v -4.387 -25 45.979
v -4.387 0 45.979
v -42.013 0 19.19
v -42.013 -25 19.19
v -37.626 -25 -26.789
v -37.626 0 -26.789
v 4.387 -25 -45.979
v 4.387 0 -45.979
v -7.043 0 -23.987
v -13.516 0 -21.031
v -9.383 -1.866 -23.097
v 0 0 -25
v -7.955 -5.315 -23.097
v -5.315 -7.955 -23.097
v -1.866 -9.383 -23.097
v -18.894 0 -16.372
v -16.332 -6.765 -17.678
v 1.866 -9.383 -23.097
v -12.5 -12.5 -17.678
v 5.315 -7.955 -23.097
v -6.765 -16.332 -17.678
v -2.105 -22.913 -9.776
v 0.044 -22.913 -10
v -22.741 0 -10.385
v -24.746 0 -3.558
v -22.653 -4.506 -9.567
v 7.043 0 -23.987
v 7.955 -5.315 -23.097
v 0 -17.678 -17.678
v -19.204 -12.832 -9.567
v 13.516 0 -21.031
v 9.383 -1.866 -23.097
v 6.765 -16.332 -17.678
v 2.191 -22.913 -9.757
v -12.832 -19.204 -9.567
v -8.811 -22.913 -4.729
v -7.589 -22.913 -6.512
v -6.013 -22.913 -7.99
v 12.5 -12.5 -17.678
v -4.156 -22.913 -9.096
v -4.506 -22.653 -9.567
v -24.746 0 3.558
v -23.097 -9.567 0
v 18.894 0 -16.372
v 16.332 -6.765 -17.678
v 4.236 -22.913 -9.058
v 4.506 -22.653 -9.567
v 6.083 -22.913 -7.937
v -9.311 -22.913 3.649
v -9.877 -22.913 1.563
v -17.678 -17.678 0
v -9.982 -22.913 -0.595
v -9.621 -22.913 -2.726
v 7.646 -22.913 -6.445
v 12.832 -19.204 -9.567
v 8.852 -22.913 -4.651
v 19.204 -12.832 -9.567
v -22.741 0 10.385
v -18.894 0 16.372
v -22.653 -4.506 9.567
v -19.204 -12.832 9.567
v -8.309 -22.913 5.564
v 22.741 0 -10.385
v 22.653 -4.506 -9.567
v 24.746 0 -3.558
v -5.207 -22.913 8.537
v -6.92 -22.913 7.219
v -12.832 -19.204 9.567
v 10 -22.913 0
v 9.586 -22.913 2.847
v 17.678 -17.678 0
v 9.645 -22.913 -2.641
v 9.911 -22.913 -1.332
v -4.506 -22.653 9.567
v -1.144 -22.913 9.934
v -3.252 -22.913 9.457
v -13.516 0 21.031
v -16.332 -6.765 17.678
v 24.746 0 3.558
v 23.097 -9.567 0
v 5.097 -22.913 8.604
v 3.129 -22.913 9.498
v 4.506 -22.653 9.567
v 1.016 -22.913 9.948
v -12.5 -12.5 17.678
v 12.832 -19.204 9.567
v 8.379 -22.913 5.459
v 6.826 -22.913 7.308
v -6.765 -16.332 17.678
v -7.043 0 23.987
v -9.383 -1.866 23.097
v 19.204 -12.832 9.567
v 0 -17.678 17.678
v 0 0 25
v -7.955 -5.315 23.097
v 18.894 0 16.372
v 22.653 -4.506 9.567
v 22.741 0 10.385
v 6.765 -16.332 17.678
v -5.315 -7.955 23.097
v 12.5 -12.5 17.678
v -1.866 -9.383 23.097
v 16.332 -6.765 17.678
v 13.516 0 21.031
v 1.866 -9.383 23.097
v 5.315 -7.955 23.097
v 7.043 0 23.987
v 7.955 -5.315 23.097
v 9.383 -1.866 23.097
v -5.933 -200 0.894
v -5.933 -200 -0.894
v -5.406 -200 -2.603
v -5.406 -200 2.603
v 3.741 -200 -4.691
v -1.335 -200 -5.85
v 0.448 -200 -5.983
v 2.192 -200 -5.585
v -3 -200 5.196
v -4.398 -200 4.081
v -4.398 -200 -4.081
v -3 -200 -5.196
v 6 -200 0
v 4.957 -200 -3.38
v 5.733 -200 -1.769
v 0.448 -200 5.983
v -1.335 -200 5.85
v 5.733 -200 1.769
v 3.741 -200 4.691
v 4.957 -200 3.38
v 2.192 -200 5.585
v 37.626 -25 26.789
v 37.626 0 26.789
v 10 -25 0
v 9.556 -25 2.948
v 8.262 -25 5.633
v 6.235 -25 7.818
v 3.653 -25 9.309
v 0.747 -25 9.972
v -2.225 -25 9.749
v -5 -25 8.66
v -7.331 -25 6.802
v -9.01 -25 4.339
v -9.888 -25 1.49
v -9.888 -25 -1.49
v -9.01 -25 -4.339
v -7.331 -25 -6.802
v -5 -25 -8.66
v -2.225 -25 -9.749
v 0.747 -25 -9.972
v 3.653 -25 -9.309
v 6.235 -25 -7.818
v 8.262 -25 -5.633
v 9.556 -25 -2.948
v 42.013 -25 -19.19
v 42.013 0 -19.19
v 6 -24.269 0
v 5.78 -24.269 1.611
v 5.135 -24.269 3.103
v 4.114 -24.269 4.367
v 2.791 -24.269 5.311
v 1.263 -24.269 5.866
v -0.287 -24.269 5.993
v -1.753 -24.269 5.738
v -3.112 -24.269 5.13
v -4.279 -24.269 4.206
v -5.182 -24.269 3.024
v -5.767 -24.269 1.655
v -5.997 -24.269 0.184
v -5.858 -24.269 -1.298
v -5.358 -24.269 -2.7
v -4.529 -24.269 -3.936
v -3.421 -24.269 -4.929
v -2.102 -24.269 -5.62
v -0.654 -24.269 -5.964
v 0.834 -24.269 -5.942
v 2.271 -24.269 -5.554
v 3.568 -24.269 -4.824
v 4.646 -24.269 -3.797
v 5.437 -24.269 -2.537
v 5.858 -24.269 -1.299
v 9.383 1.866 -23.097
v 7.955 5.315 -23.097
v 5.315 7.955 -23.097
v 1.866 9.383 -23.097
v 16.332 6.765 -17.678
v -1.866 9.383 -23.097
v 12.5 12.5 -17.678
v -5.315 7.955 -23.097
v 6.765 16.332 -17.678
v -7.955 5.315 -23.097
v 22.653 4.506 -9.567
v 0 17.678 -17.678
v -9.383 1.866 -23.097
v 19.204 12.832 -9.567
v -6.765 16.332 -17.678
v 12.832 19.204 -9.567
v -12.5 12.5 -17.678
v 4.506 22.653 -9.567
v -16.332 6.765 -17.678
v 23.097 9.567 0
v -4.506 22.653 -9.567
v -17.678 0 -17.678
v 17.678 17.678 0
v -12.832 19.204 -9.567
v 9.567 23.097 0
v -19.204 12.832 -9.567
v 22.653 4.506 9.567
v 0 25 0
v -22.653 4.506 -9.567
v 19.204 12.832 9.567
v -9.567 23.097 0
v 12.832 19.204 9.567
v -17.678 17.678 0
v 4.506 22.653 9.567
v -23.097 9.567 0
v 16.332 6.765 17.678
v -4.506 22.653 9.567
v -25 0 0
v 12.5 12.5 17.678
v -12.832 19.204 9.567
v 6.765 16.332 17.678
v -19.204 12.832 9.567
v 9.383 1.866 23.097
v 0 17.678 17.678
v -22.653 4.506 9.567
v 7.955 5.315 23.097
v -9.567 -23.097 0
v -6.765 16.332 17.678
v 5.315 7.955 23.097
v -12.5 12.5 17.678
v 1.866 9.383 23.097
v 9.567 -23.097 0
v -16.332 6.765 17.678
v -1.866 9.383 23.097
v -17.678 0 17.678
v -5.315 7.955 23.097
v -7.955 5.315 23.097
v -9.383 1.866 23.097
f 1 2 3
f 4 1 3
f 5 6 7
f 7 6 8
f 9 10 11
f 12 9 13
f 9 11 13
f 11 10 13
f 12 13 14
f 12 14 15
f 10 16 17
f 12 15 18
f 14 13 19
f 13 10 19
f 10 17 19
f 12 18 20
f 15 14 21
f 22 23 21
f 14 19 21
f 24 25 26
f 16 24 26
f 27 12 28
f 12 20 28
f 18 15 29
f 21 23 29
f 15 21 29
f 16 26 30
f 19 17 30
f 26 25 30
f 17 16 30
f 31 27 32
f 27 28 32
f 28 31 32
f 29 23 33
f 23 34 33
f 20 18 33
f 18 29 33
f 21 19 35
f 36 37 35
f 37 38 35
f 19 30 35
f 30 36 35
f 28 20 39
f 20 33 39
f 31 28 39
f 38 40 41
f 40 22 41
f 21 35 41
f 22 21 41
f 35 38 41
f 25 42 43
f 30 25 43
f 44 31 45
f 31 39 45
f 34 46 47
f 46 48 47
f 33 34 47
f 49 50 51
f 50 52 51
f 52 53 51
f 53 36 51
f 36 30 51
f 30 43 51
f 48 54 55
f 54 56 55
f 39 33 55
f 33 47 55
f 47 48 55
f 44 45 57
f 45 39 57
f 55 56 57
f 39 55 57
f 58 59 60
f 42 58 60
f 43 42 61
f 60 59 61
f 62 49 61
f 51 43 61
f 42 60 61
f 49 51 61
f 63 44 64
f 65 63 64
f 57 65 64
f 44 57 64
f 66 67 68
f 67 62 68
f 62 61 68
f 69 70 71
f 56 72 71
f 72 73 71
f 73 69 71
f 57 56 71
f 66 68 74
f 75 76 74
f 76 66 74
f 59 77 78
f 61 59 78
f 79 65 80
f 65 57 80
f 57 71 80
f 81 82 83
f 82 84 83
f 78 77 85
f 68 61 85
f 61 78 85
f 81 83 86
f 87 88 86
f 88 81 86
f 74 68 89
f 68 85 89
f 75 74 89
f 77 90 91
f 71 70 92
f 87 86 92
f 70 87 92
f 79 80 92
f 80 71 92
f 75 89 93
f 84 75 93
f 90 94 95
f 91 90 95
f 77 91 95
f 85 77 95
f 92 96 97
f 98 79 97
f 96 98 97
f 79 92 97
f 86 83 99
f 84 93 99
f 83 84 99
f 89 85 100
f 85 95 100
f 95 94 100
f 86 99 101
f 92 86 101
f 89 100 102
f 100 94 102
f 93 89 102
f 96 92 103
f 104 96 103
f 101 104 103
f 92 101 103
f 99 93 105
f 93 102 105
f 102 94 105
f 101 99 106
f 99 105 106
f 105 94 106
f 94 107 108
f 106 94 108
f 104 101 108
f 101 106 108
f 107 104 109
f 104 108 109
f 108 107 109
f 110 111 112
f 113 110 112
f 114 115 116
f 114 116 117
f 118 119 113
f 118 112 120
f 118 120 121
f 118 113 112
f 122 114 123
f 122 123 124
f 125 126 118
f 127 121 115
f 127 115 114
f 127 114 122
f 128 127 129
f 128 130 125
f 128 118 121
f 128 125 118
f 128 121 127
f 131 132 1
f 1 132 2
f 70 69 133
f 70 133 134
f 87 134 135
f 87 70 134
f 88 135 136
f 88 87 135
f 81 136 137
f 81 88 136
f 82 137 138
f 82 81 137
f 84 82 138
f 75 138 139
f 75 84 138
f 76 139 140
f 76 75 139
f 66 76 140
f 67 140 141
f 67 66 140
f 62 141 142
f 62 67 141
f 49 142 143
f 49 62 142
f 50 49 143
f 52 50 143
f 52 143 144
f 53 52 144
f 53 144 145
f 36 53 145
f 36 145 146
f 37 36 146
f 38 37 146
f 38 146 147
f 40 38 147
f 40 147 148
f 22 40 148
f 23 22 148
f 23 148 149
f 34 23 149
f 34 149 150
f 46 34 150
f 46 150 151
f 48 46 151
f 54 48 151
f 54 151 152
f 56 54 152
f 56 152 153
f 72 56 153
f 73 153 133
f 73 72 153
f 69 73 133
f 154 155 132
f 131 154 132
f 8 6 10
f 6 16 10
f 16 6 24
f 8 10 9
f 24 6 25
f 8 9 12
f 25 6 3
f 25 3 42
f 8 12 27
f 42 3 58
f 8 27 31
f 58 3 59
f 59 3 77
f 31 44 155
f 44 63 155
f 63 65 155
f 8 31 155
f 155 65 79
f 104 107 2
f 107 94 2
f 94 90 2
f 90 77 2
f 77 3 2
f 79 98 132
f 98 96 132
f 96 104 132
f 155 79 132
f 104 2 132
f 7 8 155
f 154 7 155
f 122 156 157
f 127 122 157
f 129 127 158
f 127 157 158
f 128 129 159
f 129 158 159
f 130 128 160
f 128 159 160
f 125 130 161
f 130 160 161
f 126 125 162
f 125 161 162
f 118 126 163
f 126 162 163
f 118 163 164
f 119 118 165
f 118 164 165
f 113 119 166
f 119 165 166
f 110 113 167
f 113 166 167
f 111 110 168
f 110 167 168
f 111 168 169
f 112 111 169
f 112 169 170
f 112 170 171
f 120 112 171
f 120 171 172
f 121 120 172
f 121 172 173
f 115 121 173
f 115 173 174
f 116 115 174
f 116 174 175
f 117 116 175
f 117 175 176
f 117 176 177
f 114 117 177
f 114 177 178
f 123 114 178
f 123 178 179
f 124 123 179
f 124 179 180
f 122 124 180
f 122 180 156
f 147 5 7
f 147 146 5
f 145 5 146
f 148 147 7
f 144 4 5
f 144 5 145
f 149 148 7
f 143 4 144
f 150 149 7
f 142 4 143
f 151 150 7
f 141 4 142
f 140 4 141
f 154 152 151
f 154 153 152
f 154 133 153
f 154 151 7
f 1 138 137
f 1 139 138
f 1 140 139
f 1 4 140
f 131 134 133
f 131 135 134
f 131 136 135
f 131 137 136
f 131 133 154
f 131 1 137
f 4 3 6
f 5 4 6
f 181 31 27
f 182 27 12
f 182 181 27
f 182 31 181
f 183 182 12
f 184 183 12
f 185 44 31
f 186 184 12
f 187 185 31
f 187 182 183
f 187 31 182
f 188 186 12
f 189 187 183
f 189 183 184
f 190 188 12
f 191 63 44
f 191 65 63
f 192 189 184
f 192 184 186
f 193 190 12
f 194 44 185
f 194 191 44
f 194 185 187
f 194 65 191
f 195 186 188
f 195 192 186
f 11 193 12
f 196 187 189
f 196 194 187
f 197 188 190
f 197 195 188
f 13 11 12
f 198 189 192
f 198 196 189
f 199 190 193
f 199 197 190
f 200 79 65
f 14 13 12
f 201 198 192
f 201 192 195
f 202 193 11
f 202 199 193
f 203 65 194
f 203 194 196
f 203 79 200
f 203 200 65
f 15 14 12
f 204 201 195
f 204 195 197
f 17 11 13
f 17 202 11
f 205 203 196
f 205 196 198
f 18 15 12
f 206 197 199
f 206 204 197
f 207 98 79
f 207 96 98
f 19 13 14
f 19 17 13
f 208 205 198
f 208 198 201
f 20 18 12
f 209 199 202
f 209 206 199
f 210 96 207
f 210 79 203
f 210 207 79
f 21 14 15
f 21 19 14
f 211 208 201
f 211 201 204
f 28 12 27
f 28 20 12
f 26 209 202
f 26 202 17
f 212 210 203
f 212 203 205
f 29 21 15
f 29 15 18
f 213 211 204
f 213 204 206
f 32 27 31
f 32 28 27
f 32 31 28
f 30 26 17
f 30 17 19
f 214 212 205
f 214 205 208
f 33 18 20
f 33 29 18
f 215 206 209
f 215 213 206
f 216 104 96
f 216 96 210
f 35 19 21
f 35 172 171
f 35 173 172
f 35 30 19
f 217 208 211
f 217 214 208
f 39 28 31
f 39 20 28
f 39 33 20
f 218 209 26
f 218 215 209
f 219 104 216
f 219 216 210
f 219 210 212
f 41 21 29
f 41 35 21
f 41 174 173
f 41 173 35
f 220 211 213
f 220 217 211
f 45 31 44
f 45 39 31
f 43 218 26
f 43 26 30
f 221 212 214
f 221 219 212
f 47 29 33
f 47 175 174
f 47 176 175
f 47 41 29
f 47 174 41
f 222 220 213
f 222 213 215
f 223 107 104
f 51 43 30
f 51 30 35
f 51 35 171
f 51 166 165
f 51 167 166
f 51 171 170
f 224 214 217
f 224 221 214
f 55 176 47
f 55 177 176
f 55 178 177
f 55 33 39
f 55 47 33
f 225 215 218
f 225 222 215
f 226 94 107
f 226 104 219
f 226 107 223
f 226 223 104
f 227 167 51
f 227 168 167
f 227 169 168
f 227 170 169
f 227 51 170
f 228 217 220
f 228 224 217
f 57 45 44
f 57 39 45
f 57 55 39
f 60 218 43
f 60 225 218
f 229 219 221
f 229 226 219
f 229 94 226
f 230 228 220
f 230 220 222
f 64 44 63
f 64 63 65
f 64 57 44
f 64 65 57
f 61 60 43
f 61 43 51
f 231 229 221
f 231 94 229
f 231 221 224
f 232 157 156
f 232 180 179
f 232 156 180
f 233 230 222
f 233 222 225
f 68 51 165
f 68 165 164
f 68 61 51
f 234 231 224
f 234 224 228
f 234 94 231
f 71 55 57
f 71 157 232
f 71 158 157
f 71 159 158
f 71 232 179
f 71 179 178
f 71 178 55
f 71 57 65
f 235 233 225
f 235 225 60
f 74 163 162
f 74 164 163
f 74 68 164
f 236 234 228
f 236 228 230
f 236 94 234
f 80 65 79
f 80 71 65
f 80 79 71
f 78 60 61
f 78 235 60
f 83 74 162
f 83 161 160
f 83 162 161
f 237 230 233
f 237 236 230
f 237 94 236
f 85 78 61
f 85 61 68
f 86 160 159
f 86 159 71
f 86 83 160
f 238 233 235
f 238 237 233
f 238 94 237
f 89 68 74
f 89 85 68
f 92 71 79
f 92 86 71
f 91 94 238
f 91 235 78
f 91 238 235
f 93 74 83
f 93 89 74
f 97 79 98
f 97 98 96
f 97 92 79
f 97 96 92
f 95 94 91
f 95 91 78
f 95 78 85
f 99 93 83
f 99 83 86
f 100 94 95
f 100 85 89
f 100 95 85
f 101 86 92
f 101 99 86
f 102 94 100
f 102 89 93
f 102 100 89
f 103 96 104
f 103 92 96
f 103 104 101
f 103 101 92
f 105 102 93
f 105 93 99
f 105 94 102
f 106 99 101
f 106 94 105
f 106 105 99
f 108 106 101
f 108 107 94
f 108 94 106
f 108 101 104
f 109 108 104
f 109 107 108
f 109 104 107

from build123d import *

# Parameters (mm, degrees)
F2_R     = 6
F3_DEPTH = 200
F4_R     = 10
F5_DEPTH = 25


with BuildPart() as f1:
    # F0 (on Front) → F1 (revolve)
    with BuildSketch(Plane.XZ):
        with BuildLine():
            Line((0, 25), (0, -25))
            ThreePointArc((0, -25), (25, 0), (0, 25))
        make_face()
    revolve(axis=Axis((0, 0, 0), (0, 0, 1)))

    # F2 (on Front) → F3 (join)
    with BuildSketch(Plane.XZ):
        Circle(F2_R)
    extrude(amount=F3_DEPTH)


with BuildPart() as f5:
    # F4 (on Front) → F5 (new body)
    with BuildSketch(Plane.XZ):
        Polygon((-42.0127453861, 19.1901682759), (-37.6255459229, -26.7890206491), (4.3871994632, -45.979188925), (42.0127453861, -19.1901682759), (37.6255459229, 26.7890206491), (-4.3871994632, 45.979188925), align=None)
        Circle(F4_R, mode=Mode.SUBTRACT)
    extrude(amount=F5_DEPTH)

    # F6 (on Right) → F7 (revolve, cut)
    with BuildSketch(Plane.YZ):
        with BuildLine():
            Line((0, 25), (0, -25))
            ThreePointArc((0, -25), (25, 0), (0, 25))
        make_face()
    revolve(axis=Axis((0, 0, 0), (0, 0, 1)), mode=Mode.SUBTRACT)


solid = Compound([f1.part, f5.part])
